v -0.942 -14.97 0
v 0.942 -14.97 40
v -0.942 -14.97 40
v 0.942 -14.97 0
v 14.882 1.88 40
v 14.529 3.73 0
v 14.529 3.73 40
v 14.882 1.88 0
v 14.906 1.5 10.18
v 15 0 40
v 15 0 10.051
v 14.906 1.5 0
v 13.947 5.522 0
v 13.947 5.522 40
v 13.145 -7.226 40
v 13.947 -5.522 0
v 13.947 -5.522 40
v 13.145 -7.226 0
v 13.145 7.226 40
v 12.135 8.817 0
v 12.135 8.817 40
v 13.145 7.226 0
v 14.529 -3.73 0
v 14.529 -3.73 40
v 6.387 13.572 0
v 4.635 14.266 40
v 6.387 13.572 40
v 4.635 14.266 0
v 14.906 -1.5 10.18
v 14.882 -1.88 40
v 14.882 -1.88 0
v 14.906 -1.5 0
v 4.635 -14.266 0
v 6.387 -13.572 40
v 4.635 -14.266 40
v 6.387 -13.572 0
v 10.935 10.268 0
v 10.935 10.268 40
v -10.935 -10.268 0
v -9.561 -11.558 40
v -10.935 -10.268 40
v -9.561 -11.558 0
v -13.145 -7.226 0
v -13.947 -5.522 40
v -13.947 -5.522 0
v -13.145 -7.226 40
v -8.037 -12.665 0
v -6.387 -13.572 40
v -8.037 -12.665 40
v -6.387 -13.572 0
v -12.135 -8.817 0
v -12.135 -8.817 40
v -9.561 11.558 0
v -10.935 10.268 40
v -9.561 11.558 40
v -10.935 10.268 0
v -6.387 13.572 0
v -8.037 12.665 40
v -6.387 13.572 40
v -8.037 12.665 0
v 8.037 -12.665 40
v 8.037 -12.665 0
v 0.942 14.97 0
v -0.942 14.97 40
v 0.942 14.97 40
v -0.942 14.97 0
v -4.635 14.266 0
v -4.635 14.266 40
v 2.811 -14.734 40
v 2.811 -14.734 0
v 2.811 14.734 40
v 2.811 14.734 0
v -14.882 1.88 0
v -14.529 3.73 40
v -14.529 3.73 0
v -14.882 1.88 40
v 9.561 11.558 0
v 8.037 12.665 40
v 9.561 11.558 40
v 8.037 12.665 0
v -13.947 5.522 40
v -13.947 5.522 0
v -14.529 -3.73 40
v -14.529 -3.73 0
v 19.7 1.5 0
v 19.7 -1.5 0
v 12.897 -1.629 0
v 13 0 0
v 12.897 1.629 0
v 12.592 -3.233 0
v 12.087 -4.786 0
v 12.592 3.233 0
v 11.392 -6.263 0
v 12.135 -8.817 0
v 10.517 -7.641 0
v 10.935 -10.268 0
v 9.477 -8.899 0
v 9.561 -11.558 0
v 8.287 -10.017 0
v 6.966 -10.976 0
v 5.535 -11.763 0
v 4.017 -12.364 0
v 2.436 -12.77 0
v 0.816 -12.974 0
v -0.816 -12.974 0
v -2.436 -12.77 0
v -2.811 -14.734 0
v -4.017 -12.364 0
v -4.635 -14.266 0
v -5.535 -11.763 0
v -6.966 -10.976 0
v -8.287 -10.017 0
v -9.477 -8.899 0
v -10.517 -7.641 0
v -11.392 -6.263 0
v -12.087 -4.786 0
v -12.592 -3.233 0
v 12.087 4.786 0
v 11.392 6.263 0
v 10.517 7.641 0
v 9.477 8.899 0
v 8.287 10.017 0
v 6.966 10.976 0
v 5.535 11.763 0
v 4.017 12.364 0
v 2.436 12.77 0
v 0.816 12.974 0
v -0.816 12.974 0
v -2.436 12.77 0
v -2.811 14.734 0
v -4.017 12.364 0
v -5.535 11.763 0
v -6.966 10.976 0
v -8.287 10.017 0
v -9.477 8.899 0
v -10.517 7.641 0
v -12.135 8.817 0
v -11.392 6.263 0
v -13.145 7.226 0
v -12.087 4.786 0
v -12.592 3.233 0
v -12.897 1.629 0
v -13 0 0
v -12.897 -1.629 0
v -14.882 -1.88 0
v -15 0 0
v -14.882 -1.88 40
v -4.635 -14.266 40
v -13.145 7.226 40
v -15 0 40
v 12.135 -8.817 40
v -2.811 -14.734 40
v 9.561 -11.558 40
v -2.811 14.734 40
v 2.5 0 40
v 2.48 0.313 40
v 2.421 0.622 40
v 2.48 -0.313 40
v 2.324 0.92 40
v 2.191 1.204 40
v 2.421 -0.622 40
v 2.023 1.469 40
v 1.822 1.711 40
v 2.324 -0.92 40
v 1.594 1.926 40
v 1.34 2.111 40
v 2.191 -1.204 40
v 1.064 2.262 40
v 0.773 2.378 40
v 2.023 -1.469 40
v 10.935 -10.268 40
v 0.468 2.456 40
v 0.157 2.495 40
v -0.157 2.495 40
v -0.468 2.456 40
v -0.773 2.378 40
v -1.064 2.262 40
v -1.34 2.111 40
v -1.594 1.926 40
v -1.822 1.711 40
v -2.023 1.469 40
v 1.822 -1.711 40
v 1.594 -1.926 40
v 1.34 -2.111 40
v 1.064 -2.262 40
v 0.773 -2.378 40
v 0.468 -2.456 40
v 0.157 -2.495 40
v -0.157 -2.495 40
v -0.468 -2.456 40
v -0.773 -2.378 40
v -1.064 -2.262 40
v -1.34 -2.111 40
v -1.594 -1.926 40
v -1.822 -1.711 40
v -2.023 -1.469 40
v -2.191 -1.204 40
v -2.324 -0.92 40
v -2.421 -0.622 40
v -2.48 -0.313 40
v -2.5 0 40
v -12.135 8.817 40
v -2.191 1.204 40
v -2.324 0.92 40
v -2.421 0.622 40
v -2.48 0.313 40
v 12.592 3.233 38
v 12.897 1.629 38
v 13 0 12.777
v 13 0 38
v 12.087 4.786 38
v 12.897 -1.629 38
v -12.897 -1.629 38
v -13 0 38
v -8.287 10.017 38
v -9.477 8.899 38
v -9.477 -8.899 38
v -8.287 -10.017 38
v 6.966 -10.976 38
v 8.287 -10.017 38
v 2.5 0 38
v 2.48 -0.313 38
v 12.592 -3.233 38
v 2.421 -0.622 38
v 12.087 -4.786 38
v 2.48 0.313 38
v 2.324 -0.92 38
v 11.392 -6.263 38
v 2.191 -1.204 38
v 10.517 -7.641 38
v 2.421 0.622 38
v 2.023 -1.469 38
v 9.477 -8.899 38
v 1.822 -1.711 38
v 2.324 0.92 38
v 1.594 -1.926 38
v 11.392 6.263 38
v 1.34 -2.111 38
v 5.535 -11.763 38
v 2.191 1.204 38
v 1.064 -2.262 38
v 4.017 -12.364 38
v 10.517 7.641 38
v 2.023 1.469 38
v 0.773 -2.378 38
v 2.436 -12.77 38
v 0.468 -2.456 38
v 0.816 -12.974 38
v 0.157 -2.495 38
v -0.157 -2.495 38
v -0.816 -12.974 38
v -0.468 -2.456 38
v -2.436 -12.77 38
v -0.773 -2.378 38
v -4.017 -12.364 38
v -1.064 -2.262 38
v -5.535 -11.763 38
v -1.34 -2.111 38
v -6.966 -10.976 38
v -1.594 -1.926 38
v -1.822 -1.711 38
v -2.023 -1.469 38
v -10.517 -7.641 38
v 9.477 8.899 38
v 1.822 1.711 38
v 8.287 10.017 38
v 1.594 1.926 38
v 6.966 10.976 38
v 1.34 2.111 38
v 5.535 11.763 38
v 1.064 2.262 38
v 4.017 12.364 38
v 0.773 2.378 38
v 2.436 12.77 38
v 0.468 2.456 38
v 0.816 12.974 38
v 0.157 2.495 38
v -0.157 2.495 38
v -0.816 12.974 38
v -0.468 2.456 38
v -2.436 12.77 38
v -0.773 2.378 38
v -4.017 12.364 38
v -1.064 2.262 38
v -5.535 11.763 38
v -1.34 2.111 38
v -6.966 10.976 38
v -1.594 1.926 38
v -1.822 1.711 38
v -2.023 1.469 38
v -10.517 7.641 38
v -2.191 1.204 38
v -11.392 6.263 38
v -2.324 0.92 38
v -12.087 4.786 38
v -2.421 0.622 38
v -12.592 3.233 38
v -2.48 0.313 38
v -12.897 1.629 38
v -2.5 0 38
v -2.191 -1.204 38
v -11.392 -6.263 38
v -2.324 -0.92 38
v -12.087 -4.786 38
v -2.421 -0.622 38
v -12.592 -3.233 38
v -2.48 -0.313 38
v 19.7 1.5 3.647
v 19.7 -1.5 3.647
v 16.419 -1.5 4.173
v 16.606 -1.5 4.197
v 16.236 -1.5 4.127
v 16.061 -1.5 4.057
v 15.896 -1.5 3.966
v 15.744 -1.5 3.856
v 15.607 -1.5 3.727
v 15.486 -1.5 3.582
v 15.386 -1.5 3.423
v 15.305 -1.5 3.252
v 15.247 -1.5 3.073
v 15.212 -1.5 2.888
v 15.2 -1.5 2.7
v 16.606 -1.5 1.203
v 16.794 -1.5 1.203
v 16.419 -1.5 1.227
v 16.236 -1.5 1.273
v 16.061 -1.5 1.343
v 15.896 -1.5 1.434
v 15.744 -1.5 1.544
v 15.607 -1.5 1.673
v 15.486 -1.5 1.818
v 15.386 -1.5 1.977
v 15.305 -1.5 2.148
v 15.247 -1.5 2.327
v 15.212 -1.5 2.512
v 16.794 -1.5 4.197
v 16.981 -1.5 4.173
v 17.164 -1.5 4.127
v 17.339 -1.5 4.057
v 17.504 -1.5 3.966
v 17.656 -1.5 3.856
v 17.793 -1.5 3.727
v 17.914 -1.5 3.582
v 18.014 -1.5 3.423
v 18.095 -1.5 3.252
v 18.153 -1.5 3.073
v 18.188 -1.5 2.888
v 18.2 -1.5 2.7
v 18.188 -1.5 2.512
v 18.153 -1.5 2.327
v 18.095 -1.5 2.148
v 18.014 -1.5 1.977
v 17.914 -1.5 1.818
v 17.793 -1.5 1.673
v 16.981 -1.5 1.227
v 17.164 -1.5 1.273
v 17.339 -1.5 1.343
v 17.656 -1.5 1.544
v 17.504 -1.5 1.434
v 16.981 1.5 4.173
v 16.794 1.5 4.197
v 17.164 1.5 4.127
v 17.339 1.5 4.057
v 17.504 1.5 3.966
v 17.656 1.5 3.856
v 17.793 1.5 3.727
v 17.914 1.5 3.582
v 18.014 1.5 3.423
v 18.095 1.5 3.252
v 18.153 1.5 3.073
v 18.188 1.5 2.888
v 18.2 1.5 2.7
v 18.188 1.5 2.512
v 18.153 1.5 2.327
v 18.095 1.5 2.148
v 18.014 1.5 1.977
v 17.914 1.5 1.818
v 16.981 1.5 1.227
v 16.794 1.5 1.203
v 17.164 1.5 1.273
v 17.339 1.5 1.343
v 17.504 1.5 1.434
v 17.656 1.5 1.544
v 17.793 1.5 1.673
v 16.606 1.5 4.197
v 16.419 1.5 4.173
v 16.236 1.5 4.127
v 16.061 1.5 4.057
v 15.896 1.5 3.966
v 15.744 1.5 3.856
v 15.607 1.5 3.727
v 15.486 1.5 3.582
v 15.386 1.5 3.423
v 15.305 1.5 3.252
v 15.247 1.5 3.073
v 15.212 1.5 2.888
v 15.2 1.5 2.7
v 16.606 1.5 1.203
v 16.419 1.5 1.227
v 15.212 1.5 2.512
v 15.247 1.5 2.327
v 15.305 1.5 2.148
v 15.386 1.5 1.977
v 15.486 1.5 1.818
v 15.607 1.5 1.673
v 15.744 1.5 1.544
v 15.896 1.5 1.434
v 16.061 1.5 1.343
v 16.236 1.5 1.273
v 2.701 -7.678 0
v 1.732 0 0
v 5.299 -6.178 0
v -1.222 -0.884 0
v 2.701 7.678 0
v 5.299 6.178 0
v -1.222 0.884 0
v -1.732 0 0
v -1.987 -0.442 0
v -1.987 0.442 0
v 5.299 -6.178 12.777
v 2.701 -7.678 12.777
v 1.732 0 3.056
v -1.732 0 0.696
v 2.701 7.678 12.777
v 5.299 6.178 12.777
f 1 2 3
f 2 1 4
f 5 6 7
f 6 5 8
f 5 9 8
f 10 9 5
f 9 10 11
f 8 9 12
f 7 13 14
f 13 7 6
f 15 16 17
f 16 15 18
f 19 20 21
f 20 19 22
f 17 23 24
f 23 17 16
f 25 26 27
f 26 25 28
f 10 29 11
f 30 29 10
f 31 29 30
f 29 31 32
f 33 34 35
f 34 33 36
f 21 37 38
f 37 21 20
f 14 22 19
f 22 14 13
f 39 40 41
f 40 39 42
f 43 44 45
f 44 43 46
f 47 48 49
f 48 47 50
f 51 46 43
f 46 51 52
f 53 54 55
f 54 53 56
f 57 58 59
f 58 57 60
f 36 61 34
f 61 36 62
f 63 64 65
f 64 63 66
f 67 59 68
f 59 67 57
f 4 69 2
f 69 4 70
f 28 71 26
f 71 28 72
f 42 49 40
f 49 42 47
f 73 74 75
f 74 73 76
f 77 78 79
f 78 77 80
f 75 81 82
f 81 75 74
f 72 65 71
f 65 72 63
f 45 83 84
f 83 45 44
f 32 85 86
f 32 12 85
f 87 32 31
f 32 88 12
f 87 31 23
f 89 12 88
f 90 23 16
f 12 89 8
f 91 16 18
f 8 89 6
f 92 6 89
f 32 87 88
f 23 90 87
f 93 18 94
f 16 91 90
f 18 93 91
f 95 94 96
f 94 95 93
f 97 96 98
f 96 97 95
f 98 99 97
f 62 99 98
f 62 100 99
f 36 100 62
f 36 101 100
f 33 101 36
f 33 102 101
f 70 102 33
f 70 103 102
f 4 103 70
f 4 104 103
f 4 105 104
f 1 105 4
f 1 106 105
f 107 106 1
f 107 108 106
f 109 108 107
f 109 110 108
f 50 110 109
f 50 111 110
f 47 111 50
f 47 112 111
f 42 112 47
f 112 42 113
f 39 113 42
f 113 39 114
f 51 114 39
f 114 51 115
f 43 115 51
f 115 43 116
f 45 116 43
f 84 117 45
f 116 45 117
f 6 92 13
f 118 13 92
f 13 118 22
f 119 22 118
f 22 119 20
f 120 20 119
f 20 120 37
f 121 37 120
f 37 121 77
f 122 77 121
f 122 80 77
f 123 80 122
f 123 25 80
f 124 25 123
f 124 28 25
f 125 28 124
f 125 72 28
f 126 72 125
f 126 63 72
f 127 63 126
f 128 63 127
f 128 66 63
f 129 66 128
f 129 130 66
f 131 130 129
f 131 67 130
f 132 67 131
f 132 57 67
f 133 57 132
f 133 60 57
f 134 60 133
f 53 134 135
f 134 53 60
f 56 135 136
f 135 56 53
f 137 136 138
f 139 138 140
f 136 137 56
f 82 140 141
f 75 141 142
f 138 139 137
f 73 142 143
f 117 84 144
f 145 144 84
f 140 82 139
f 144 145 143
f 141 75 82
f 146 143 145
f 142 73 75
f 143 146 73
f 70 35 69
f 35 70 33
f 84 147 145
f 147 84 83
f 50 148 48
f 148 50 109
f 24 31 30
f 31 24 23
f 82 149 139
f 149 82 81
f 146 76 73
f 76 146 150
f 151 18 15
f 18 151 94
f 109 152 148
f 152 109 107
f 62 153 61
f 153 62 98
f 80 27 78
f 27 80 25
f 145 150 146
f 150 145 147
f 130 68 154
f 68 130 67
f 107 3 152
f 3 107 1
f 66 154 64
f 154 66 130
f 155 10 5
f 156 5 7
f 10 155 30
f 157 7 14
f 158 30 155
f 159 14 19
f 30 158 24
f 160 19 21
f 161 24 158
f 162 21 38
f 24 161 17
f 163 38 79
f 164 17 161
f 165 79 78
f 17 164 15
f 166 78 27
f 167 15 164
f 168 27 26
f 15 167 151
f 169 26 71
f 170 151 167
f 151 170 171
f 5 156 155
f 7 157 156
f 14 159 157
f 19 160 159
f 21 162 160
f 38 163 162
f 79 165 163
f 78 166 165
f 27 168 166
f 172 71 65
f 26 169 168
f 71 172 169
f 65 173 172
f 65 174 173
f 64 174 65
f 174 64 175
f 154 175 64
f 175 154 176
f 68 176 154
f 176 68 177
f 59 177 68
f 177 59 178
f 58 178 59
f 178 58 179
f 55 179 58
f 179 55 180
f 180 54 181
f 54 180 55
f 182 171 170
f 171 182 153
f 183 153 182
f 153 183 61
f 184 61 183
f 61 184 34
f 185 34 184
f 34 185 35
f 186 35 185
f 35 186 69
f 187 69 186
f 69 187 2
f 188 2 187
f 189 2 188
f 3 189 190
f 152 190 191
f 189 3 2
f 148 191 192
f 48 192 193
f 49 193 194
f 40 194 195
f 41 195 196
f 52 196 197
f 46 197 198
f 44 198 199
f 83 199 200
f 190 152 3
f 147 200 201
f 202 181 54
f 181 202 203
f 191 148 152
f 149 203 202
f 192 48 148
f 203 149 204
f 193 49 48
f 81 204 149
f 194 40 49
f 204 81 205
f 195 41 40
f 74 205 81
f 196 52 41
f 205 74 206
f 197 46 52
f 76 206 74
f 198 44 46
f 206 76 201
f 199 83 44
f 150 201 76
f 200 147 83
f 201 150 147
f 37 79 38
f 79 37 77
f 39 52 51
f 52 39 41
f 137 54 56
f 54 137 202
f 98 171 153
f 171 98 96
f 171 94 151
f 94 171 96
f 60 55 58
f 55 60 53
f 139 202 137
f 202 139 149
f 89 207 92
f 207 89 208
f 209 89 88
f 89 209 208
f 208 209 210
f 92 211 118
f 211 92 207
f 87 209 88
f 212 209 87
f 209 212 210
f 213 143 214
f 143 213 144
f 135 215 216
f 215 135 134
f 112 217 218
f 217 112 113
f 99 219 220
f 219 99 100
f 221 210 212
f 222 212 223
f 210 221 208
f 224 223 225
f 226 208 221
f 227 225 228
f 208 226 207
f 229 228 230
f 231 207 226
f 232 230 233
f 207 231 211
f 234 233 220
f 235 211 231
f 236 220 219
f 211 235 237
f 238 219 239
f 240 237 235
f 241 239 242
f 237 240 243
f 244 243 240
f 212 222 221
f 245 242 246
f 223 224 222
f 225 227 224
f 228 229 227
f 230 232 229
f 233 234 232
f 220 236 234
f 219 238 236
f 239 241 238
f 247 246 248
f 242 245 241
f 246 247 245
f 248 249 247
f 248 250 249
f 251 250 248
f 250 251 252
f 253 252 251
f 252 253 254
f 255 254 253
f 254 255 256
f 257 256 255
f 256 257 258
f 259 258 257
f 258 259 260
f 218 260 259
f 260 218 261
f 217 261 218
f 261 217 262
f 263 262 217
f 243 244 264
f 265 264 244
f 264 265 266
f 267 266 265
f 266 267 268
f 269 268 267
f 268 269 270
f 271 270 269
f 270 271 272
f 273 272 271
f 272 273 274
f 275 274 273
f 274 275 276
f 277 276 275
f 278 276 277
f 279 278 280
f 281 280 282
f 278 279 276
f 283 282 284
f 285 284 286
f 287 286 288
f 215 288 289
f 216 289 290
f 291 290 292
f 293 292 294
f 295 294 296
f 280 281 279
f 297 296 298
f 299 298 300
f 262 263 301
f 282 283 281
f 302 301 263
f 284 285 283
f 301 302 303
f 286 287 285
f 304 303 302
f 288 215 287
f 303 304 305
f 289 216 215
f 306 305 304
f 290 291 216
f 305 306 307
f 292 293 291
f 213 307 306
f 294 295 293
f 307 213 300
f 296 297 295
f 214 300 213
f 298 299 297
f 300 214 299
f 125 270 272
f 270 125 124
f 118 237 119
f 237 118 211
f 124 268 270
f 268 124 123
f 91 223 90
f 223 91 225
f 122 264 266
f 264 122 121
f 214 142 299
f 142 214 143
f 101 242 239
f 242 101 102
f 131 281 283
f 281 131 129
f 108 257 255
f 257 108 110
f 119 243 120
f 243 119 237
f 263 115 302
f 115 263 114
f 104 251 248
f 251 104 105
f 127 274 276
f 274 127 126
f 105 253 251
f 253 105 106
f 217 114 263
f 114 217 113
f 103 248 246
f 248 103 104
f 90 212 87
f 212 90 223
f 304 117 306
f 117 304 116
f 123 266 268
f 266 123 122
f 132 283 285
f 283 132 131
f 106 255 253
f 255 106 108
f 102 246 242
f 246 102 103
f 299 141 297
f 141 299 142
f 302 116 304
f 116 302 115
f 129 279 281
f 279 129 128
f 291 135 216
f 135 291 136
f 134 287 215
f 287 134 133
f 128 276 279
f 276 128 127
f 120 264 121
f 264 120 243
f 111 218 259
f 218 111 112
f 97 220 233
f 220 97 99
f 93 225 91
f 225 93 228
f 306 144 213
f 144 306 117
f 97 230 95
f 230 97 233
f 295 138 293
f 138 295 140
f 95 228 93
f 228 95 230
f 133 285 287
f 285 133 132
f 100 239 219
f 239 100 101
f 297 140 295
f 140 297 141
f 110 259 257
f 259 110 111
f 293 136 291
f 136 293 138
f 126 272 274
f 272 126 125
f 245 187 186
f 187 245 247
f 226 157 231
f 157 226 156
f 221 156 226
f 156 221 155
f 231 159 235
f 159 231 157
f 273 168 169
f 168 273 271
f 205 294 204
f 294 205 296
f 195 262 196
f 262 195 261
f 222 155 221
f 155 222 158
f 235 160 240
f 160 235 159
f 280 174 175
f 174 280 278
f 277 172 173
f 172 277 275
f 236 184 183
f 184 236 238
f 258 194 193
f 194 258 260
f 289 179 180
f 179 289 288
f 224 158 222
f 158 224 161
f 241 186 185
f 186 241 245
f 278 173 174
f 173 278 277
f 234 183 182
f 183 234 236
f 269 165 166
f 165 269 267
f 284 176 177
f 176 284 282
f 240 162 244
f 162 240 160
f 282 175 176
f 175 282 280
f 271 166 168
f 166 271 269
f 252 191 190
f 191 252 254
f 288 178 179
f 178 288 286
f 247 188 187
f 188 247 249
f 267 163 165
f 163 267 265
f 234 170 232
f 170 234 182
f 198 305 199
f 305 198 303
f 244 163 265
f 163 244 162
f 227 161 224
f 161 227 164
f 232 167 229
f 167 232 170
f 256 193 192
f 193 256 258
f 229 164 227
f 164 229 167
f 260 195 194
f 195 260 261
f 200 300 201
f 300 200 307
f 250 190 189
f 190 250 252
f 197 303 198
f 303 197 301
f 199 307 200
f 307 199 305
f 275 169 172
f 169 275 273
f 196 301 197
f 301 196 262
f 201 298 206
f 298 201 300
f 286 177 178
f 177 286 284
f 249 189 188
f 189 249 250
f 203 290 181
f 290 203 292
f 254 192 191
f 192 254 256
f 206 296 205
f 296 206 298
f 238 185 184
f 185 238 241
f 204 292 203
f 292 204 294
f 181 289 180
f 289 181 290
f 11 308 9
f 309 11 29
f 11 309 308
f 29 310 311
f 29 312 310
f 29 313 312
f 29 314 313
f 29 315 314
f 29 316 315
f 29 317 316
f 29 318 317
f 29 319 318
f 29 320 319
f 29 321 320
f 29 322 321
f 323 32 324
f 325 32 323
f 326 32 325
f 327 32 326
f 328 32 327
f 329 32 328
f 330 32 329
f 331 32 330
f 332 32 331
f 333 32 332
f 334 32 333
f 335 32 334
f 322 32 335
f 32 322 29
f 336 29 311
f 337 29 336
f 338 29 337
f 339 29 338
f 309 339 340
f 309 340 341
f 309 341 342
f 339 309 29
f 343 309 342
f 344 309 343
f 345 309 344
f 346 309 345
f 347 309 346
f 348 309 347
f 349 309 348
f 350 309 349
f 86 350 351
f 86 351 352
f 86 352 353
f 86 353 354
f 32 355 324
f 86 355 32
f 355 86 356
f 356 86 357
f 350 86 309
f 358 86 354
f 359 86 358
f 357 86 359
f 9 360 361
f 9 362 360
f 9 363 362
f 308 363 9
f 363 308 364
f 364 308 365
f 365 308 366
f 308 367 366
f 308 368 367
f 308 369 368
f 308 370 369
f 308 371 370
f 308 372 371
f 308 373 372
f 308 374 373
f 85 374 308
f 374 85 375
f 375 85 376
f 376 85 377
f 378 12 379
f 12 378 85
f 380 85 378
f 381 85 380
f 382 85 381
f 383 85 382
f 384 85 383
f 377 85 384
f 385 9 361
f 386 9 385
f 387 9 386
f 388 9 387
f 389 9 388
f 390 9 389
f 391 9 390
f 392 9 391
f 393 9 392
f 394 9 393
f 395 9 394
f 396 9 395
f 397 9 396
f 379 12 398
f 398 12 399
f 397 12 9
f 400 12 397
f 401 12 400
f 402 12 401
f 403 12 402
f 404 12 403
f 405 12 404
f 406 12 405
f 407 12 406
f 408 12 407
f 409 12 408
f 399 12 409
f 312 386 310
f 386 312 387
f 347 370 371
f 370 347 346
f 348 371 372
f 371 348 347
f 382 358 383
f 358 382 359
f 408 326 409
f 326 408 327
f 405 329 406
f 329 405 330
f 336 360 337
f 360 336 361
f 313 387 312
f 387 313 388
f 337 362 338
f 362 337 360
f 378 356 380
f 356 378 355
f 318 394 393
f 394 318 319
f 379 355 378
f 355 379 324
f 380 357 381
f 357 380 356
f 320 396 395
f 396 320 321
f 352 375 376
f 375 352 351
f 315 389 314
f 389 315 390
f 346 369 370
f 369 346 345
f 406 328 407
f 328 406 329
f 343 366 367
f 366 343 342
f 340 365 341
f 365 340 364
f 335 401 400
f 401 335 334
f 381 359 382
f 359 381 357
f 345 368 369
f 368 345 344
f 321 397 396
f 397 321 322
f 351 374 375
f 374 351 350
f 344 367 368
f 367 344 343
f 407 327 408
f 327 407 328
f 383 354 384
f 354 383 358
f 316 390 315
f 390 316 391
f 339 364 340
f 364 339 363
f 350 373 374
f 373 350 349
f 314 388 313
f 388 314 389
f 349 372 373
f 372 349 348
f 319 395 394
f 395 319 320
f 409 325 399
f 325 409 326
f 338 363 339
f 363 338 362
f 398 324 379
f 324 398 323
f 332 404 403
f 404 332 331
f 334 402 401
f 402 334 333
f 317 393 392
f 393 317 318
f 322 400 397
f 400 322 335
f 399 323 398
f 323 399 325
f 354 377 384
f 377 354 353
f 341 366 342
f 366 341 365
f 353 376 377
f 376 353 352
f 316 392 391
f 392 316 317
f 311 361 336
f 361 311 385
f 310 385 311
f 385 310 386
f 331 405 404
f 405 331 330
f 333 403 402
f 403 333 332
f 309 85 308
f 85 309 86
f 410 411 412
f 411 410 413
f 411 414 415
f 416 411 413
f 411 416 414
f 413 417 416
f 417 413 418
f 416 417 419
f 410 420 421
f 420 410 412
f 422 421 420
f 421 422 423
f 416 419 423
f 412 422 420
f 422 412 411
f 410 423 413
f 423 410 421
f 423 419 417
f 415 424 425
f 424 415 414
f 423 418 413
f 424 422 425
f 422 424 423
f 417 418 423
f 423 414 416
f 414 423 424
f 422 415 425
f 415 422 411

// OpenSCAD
$fn=50;

height = 40;
diameterInside = 26;
thickness = 2;
diameterOutside = diameterInside+2*thickness;
diameterHoleOnTop = 5;

flangeHole = 3;
flangeThickness = 3;

difference()
{
cylinder(h=height, d=diameterOutside);

cylinder(h= height - thickness, d= diameterInside);
    
cylinder(h = height+1, d= diameterHoleOnTop);
}


for(i=[0:120:359])
{
    echo(i);
    basePoint = 
    [
        (diameterOutside/2-1)*cos(i),
        (diameterOutside/2-1)*sin(i),
        0
    ];

    rotate([0,0,i])flange(basePoint, flangeThickness, flangeHole);
}
module flange(basePoint, thick, hole)
{
    HOLEA = 1.8* hole;
    //Default: Draws triangle on the XZ plane
    xB = basePoint[0] + HOLEA/2*(1/(tan(30))+1/tan(45));
    
    zA = basePoint[2] + HOLEA/2*(1/(tan(15))+1/tan(45));
    
    holeCenter = 
    [
    basePoint[0] + HOLEA/2,
    basePoint[1],
    basePoint[2] + HOLEA/2
    ];
    
    diffCubeTranslate =
    [
    holeCenter[0] + 1.5*hole,
    holeCenter[1],
    holeCenter[2]+5
    ];
    
    echo("xB is:", xB);
    echo("zA is:", zA);
    echo("holeCent is:", holeCenter);
    
    //Points of polyhedron:
    Points = 
    [
    [basePoint[0]-1,thick/2,0],
    [basePoint[0]-1,-thick/2,0],
    [xB+1,-thick/2,0],
    [xB+1,thick/2,0],
    [basePoint[0]-1,thick/2,zA],
    [basePoint[0]-1,-thick/2,zA]
    ];
    //Faces of polyhedron:
    Faces =
    [
    [0,1,2,3],
    [0,3,4],
    [1,5,2],
    [3,2,5,4],
    [4,5,1,0]
    //oreder matters, says where the norm will point
    ];
    
    difference()
    {
    polyhedron(Points,Faces);
        translate(holeCenter)rotate(a=[90,0,0]) cylinder(h = thick+2, d=hole, center = true);
        translate(diffCubeTranslate) cube([thick,thick, 2*zA], center=true);
        
    }
    
    
    
    
}
